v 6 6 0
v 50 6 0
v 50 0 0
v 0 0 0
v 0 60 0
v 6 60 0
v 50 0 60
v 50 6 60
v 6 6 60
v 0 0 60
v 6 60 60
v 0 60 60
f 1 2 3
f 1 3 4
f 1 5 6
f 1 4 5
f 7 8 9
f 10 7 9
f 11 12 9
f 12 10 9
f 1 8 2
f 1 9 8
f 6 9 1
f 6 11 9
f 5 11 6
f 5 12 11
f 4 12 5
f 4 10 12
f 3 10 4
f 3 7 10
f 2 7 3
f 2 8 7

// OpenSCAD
$fn = 32;

// ----------------------------------------------------------------------
// Structural section: angle 50 x 60 mm
// ----------------------------------------------------------------------

// --- parameters (mm) ---
sec_w = 50;               // leg width, X
sec_h = 60;               // leg height, Y
flange_t = 6;             // leg thickness
plate_t = 60;             // cut length, Z (extrusion height)

profile = [[0, 0], [50, 0], [50, 6], [6, 6], [6, 60], [0, 60]];  // primary outline, 6 points, counter clockwise

// --- the one profile operation ---
linear_extrude(height = plate_t) polygon(points = profile);
